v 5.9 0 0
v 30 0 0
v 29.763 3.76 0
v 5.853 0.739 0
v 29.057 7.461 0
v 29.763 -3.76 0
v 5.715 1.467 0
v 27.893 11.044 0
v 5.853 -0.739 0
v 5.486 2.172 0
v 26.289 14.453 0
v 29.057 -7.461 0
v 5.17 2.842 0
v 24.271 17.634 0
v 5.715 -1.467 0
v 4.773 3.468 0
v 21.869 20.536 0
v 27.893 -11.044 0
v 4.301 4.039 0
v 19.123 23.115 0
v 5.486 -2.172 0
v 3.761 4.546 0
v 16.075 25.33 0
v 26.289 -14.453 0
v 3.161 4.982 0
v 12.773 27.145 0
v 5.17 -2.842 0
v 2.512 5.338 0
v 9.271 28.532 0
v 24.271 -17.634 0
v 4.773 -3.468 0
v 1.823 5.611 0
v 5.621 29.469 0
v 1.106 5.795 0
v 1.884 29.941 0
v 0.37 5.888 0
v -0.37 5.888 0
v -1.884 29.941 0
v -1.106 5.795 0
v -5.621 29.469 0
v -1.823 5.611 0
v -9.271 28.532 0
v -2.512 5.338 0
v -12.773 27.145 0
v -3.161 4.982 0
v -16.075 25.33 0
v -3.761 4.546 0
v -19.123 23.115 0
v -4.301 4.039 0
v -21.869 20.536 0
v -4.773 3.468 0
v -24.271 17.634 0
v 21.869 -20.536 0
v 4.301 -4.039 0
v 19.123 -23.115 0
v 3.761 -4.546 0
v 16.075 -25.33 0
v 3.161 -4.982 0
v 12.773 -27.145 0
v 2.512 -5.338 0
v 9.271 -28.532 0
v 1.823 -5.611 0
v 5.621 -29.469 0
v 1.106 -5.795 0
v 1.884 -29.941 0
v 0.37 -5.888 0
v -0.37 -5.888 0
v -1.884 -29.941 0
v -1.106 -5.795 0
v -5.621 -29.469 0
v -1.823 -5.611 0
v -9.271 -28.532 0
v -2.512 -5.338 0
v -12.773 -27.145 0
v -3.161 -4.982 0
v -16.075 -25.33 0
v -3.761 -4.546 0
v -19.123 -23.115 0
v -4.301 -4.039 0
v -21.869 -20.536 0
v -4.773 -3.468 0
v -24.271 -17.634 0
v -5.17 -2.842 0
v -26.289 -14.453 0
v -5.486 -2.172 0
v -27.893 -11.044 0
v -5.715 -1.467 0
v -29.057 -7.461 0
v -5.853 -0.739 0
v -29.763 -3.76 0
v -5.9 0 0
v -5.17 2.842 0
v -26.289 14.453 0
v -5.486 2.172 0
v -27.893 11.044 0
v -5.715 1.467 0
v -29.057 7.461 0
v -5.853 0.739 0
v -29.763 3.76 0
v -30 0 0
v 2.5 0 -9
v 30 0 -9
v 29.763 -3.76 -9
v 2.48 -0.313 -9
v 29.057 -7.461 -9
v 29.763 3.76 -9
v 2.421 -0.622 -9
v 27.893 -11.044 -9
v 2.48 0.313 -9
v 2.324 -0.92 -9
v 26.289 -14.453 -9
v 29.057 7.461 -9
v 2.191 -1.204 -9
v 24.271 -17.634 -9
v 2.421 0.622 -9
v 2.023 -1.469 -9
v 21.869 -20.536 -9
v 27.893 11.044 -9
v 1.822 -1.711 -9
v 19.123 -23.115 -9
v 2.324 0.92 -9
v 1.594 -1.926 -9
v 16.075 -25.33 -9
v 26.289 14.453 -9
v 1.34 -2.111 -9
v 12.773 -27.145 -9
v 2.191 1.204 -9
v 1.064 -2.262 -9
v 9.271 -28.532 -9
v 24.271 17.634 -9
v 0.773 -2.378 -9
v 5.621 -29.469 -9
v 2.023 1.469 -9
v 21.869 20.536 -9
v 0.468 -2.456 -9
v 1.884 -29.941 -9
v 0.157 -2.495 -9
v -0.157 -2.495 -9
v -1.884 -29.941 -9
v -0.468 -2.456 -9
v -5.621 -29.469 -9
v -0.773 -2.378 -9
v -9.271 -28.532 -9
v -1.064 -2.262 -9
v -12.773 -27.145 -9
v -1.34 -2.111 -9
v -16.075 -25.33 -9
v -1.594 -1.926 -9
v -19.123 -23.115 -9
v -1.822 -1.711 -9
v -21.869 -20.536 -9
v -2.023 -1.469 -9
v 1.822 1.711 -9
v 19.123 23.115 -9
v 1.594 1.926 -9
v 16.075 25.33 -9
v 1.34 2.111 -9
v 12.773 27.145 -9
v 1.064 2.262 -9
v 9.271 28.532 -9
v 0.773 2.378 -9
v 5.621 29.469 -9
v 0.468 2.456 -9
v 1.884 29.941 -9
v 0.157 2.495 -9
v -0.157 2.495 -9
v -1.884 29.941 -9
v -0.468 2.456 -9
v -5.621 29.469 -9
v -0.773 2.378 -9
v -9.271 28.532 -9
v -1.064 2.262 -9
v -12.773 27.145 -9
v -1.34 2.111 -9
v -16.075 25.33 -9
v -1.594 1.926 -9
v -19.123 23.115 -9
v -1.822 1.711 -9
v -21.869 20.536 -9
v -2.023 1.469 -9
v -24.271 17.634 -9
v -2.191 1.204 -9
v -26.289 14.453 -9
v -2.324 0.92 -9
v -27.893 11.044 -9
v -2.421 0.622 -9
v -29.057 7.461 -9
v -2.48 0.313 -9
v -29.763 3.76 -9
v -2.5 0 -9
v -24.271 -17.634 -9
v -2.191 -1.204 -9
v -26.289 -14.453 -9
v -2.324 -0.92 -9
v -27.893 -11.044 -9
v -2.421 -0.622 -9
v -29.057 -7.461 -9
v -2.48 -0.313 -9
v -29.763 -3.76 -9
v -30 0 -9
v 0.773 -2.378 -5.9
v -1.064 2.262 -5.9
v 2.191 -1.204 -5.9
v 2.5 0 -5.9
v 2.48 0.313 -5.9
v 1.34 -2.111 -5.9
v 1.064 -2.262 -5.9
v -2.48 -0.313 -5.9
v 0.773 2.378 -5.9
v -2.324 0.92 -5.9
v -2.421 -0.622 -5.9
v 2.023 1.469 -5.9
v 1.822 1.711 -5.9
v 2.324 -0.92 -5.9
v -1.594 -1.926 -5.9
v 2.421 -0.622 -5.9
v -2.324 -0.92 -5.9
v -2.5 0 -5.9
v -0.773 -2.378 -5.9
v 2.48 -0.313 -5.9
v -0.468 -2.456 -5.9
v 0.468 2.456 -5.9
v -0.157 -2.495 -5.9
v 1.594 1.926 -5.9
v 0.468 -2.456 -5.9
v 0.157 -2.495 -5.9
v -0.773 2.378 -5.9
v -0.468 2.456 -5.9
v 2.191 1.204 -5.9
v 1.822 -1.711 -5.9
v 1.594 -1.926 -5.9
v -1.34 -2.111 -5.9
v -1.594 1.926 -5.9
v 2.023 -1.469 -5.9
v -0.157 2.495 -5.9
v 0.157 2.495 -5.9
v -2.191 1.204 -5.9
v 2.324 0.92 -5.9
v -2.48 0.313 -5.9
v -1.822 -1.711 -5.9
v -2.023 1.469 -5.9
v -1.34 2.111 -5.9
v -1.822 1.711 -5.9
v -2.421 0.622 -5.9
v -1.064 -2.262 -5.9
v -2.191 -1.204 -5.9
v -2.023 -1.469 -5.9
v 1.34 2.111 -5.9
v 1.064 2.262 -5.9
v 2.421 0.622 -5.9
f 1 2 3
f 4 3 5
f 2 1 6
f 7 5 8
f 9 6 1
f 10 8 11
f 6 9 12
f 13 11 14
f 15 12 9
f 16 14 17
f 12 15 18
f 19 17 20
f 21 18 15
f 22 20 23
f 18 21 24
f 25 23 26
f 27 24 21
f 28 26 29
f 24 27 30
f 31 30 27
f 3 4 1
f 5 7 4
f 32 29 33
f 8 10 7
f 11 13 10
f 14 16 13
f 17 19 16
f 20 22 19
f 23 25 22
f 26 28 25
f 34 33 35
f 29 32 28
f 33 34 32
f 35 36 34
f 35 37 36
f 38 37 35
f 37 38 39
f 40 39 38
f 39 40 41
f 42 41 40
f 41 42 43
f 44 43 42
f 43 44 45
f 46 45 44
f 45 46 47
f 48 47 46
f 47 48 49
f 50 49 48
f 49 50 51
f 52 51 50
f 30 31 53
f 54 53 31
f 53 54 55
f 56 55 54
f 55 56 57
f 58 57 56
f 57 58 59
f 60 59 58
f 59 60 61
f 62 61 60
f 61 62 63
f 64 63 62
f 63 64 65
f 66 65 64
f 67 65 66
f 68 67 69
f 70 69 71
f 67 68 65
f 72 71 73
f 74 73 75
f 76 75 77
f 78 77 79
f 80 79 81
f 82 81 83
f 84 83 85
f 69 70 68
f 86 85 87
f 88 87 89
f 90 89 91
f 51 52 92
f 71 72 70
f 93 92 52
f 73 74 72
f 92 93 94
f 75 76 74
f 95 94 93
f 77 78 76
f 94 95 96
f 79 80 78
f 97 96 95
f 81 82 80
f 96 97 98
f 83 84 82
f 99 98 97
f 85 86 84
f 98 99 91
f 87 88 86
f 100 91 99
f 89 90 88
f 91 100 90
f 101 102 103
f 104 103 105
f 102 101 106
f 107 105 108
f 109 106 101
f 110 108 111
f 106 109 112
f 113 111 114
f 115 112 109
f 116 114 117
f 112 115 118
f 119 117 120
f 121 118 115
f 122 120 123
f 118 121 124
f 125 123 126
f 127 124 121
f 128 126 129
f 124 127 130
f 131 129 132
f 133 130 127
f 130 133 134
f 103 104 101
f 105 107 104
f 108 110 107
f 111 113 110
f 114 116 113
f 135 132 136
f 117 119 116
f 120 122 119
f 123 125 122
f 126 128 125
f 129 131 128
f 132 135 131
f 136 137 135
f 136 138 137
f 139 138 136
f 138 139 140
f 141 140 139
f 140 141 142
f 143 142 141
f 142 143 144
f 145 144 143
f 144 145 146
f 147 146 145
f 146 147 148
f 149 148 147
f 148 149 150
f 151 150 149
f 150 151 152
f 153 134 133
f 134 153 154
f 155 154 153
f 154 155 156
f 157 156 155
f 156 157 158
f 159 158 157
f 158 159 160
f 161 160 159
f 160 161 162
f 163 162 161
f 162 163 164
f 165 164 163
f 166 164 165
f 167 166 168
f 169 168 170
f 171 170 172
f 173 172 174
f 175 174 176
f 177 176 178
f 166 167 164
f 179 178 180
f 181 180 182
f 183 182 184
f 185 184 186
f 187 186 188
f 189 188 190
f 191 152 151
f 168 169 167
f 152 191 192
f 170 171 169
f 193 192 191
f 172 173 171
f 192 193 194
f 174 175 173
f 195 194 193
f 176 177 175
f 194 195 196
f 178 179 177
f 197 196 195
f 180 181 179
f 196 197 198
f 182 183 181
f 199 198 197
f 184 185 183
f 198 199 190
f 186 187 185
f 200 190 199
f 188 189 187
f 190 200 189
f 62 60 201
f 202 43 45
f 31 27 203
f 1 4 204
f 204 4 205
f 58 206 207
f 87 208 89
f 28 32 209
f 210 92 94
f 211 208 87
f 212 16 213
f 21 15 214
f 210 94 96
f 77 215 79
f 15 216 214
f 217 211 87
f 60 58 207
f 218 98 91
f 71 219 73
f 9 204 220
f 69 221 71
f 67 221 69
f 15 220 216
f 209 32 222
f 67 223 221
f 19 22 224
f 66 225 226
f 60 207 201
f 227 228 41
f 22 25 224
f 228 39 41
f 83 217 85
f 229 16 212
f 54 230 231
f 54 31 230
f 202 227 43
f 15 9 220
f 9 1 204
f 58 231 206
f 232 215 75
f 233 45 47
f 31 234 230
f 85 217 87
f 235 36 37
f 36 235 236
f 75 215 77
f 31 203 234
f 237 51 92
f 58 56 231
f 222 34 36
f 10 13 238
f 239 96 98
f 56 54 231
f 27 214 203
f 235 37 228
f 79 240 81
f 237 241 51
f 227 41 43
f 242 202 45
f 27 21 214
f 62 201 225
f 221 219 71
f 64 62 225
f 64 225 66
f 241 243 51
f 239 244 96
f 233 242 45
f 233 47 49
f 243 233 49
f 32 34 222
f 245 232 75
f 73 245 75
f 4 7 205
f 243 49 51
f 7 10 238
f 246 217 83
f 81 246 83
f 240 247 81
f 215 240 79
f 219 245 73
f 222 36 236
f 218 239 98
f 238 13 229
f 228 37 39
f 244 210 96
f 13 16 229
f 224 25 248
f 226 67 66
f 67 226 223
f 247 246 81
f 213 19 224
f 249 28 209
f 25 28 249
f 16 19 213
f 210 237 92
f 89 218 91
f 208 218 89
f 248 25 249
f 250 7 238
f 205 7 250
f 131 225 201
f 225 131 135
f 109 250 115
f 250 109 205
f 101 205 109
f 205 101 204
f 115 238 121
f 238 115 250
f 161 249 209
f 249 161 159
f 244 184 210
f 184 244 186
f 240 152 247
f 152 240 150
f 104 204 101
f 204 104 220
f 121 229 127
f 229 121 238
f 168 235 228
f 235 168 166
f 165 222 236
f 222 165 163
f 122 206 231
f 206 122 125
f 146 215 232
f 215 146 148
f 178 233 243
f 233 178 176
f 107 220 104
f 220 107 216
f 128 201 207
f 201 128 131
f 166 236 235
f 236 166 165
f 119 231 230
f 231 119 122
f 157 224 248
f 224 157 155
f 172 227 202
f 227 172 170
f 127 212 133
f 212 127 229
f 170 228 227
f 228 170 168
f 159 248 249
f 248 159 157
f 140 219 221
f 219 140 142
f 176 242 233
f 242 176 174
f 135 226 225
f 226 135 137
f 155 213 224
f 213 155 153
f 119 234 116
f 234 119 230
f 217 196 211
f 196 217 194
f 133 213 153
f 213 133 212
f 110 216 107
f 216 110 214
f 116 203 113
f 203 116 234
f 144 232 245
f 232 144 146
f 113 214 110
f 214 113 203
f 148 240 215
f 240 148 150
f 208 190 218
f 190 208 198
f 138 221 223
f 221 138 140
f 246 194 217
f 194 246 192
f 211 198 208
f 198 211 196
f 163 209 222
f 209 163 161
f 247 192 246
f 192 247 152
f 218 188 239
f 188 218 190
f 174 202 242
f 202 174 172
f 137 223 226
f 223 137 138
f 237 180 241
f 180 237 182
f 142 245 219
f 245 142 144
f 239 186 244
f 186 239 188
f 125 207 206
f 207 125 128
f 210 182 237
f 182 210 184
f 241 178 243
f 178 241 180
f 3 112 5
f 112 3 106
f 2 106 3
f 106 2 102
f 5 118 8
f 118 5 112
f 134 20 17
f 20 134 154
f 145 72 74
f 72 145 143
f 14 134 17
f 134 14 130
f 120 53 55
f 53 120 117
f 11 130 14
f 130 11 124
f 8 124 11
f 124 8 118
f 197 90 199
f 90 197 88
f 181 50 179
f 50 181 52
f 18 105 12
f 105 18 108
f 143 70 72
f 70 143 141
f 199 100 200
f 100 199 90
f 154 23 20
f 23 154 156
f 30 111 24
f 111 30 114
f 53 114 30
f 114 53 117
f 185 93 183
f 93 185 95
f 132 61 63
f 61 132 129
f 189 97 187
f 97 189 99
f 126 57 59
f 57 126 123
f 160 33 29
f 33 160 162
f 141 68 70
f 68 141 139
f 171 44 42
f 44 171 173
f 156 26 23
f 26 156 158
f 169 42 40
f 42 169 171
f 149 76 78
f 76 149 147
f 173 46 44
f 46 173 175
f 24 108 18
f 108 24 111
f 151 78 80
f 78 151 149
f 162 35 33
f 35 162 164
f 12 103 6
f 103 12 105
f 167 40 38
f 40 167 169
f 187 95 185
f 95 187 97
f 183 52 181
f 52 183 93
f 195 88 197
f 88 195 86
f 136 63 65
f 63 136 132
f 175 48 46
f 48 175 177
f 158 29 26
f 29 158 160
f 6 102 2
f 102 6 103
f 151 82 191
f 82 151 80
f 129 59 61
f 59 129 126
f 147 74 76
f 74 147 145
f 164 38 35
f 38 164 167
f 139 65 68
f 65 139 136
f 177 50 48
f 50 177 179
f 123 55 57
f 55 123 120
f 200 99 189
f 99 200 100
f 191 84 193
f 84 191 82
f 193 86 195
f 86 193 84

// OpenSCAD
$fn = 50;


difference() {
	union() {
		translate(v = [0, 0, -9.0000000000]) {
			cylinder(h = 9, r = 30.0000000000);
		}
	}
	union() {
		translate(v = [0, 0, 0]) {
			rotate(a = [0, 0, 0]) {
				difference() {
					union() {
						#translate(v = [0, 0, -9.0000000000]) {
							cylinder(h = 9, r = 2.2500000000);
						}
						#translate(v = [0, 0, -5.9000000000]) {
							cylinder(h = 5.9000000000, r1 = 2.5000000000, r2 = 5.9000000000);
						}
						#translate(v = [0, 0, -9.0000000000]) {
							cylinder(h = 9, r = 2.5000000000);
						}
						#translate(v = [0, 0, -9.0000000000]) {
							cylinder(h = 9, r = 2.2500000000);
						}
					}
					union();
				}
			}
		}
	}
}
